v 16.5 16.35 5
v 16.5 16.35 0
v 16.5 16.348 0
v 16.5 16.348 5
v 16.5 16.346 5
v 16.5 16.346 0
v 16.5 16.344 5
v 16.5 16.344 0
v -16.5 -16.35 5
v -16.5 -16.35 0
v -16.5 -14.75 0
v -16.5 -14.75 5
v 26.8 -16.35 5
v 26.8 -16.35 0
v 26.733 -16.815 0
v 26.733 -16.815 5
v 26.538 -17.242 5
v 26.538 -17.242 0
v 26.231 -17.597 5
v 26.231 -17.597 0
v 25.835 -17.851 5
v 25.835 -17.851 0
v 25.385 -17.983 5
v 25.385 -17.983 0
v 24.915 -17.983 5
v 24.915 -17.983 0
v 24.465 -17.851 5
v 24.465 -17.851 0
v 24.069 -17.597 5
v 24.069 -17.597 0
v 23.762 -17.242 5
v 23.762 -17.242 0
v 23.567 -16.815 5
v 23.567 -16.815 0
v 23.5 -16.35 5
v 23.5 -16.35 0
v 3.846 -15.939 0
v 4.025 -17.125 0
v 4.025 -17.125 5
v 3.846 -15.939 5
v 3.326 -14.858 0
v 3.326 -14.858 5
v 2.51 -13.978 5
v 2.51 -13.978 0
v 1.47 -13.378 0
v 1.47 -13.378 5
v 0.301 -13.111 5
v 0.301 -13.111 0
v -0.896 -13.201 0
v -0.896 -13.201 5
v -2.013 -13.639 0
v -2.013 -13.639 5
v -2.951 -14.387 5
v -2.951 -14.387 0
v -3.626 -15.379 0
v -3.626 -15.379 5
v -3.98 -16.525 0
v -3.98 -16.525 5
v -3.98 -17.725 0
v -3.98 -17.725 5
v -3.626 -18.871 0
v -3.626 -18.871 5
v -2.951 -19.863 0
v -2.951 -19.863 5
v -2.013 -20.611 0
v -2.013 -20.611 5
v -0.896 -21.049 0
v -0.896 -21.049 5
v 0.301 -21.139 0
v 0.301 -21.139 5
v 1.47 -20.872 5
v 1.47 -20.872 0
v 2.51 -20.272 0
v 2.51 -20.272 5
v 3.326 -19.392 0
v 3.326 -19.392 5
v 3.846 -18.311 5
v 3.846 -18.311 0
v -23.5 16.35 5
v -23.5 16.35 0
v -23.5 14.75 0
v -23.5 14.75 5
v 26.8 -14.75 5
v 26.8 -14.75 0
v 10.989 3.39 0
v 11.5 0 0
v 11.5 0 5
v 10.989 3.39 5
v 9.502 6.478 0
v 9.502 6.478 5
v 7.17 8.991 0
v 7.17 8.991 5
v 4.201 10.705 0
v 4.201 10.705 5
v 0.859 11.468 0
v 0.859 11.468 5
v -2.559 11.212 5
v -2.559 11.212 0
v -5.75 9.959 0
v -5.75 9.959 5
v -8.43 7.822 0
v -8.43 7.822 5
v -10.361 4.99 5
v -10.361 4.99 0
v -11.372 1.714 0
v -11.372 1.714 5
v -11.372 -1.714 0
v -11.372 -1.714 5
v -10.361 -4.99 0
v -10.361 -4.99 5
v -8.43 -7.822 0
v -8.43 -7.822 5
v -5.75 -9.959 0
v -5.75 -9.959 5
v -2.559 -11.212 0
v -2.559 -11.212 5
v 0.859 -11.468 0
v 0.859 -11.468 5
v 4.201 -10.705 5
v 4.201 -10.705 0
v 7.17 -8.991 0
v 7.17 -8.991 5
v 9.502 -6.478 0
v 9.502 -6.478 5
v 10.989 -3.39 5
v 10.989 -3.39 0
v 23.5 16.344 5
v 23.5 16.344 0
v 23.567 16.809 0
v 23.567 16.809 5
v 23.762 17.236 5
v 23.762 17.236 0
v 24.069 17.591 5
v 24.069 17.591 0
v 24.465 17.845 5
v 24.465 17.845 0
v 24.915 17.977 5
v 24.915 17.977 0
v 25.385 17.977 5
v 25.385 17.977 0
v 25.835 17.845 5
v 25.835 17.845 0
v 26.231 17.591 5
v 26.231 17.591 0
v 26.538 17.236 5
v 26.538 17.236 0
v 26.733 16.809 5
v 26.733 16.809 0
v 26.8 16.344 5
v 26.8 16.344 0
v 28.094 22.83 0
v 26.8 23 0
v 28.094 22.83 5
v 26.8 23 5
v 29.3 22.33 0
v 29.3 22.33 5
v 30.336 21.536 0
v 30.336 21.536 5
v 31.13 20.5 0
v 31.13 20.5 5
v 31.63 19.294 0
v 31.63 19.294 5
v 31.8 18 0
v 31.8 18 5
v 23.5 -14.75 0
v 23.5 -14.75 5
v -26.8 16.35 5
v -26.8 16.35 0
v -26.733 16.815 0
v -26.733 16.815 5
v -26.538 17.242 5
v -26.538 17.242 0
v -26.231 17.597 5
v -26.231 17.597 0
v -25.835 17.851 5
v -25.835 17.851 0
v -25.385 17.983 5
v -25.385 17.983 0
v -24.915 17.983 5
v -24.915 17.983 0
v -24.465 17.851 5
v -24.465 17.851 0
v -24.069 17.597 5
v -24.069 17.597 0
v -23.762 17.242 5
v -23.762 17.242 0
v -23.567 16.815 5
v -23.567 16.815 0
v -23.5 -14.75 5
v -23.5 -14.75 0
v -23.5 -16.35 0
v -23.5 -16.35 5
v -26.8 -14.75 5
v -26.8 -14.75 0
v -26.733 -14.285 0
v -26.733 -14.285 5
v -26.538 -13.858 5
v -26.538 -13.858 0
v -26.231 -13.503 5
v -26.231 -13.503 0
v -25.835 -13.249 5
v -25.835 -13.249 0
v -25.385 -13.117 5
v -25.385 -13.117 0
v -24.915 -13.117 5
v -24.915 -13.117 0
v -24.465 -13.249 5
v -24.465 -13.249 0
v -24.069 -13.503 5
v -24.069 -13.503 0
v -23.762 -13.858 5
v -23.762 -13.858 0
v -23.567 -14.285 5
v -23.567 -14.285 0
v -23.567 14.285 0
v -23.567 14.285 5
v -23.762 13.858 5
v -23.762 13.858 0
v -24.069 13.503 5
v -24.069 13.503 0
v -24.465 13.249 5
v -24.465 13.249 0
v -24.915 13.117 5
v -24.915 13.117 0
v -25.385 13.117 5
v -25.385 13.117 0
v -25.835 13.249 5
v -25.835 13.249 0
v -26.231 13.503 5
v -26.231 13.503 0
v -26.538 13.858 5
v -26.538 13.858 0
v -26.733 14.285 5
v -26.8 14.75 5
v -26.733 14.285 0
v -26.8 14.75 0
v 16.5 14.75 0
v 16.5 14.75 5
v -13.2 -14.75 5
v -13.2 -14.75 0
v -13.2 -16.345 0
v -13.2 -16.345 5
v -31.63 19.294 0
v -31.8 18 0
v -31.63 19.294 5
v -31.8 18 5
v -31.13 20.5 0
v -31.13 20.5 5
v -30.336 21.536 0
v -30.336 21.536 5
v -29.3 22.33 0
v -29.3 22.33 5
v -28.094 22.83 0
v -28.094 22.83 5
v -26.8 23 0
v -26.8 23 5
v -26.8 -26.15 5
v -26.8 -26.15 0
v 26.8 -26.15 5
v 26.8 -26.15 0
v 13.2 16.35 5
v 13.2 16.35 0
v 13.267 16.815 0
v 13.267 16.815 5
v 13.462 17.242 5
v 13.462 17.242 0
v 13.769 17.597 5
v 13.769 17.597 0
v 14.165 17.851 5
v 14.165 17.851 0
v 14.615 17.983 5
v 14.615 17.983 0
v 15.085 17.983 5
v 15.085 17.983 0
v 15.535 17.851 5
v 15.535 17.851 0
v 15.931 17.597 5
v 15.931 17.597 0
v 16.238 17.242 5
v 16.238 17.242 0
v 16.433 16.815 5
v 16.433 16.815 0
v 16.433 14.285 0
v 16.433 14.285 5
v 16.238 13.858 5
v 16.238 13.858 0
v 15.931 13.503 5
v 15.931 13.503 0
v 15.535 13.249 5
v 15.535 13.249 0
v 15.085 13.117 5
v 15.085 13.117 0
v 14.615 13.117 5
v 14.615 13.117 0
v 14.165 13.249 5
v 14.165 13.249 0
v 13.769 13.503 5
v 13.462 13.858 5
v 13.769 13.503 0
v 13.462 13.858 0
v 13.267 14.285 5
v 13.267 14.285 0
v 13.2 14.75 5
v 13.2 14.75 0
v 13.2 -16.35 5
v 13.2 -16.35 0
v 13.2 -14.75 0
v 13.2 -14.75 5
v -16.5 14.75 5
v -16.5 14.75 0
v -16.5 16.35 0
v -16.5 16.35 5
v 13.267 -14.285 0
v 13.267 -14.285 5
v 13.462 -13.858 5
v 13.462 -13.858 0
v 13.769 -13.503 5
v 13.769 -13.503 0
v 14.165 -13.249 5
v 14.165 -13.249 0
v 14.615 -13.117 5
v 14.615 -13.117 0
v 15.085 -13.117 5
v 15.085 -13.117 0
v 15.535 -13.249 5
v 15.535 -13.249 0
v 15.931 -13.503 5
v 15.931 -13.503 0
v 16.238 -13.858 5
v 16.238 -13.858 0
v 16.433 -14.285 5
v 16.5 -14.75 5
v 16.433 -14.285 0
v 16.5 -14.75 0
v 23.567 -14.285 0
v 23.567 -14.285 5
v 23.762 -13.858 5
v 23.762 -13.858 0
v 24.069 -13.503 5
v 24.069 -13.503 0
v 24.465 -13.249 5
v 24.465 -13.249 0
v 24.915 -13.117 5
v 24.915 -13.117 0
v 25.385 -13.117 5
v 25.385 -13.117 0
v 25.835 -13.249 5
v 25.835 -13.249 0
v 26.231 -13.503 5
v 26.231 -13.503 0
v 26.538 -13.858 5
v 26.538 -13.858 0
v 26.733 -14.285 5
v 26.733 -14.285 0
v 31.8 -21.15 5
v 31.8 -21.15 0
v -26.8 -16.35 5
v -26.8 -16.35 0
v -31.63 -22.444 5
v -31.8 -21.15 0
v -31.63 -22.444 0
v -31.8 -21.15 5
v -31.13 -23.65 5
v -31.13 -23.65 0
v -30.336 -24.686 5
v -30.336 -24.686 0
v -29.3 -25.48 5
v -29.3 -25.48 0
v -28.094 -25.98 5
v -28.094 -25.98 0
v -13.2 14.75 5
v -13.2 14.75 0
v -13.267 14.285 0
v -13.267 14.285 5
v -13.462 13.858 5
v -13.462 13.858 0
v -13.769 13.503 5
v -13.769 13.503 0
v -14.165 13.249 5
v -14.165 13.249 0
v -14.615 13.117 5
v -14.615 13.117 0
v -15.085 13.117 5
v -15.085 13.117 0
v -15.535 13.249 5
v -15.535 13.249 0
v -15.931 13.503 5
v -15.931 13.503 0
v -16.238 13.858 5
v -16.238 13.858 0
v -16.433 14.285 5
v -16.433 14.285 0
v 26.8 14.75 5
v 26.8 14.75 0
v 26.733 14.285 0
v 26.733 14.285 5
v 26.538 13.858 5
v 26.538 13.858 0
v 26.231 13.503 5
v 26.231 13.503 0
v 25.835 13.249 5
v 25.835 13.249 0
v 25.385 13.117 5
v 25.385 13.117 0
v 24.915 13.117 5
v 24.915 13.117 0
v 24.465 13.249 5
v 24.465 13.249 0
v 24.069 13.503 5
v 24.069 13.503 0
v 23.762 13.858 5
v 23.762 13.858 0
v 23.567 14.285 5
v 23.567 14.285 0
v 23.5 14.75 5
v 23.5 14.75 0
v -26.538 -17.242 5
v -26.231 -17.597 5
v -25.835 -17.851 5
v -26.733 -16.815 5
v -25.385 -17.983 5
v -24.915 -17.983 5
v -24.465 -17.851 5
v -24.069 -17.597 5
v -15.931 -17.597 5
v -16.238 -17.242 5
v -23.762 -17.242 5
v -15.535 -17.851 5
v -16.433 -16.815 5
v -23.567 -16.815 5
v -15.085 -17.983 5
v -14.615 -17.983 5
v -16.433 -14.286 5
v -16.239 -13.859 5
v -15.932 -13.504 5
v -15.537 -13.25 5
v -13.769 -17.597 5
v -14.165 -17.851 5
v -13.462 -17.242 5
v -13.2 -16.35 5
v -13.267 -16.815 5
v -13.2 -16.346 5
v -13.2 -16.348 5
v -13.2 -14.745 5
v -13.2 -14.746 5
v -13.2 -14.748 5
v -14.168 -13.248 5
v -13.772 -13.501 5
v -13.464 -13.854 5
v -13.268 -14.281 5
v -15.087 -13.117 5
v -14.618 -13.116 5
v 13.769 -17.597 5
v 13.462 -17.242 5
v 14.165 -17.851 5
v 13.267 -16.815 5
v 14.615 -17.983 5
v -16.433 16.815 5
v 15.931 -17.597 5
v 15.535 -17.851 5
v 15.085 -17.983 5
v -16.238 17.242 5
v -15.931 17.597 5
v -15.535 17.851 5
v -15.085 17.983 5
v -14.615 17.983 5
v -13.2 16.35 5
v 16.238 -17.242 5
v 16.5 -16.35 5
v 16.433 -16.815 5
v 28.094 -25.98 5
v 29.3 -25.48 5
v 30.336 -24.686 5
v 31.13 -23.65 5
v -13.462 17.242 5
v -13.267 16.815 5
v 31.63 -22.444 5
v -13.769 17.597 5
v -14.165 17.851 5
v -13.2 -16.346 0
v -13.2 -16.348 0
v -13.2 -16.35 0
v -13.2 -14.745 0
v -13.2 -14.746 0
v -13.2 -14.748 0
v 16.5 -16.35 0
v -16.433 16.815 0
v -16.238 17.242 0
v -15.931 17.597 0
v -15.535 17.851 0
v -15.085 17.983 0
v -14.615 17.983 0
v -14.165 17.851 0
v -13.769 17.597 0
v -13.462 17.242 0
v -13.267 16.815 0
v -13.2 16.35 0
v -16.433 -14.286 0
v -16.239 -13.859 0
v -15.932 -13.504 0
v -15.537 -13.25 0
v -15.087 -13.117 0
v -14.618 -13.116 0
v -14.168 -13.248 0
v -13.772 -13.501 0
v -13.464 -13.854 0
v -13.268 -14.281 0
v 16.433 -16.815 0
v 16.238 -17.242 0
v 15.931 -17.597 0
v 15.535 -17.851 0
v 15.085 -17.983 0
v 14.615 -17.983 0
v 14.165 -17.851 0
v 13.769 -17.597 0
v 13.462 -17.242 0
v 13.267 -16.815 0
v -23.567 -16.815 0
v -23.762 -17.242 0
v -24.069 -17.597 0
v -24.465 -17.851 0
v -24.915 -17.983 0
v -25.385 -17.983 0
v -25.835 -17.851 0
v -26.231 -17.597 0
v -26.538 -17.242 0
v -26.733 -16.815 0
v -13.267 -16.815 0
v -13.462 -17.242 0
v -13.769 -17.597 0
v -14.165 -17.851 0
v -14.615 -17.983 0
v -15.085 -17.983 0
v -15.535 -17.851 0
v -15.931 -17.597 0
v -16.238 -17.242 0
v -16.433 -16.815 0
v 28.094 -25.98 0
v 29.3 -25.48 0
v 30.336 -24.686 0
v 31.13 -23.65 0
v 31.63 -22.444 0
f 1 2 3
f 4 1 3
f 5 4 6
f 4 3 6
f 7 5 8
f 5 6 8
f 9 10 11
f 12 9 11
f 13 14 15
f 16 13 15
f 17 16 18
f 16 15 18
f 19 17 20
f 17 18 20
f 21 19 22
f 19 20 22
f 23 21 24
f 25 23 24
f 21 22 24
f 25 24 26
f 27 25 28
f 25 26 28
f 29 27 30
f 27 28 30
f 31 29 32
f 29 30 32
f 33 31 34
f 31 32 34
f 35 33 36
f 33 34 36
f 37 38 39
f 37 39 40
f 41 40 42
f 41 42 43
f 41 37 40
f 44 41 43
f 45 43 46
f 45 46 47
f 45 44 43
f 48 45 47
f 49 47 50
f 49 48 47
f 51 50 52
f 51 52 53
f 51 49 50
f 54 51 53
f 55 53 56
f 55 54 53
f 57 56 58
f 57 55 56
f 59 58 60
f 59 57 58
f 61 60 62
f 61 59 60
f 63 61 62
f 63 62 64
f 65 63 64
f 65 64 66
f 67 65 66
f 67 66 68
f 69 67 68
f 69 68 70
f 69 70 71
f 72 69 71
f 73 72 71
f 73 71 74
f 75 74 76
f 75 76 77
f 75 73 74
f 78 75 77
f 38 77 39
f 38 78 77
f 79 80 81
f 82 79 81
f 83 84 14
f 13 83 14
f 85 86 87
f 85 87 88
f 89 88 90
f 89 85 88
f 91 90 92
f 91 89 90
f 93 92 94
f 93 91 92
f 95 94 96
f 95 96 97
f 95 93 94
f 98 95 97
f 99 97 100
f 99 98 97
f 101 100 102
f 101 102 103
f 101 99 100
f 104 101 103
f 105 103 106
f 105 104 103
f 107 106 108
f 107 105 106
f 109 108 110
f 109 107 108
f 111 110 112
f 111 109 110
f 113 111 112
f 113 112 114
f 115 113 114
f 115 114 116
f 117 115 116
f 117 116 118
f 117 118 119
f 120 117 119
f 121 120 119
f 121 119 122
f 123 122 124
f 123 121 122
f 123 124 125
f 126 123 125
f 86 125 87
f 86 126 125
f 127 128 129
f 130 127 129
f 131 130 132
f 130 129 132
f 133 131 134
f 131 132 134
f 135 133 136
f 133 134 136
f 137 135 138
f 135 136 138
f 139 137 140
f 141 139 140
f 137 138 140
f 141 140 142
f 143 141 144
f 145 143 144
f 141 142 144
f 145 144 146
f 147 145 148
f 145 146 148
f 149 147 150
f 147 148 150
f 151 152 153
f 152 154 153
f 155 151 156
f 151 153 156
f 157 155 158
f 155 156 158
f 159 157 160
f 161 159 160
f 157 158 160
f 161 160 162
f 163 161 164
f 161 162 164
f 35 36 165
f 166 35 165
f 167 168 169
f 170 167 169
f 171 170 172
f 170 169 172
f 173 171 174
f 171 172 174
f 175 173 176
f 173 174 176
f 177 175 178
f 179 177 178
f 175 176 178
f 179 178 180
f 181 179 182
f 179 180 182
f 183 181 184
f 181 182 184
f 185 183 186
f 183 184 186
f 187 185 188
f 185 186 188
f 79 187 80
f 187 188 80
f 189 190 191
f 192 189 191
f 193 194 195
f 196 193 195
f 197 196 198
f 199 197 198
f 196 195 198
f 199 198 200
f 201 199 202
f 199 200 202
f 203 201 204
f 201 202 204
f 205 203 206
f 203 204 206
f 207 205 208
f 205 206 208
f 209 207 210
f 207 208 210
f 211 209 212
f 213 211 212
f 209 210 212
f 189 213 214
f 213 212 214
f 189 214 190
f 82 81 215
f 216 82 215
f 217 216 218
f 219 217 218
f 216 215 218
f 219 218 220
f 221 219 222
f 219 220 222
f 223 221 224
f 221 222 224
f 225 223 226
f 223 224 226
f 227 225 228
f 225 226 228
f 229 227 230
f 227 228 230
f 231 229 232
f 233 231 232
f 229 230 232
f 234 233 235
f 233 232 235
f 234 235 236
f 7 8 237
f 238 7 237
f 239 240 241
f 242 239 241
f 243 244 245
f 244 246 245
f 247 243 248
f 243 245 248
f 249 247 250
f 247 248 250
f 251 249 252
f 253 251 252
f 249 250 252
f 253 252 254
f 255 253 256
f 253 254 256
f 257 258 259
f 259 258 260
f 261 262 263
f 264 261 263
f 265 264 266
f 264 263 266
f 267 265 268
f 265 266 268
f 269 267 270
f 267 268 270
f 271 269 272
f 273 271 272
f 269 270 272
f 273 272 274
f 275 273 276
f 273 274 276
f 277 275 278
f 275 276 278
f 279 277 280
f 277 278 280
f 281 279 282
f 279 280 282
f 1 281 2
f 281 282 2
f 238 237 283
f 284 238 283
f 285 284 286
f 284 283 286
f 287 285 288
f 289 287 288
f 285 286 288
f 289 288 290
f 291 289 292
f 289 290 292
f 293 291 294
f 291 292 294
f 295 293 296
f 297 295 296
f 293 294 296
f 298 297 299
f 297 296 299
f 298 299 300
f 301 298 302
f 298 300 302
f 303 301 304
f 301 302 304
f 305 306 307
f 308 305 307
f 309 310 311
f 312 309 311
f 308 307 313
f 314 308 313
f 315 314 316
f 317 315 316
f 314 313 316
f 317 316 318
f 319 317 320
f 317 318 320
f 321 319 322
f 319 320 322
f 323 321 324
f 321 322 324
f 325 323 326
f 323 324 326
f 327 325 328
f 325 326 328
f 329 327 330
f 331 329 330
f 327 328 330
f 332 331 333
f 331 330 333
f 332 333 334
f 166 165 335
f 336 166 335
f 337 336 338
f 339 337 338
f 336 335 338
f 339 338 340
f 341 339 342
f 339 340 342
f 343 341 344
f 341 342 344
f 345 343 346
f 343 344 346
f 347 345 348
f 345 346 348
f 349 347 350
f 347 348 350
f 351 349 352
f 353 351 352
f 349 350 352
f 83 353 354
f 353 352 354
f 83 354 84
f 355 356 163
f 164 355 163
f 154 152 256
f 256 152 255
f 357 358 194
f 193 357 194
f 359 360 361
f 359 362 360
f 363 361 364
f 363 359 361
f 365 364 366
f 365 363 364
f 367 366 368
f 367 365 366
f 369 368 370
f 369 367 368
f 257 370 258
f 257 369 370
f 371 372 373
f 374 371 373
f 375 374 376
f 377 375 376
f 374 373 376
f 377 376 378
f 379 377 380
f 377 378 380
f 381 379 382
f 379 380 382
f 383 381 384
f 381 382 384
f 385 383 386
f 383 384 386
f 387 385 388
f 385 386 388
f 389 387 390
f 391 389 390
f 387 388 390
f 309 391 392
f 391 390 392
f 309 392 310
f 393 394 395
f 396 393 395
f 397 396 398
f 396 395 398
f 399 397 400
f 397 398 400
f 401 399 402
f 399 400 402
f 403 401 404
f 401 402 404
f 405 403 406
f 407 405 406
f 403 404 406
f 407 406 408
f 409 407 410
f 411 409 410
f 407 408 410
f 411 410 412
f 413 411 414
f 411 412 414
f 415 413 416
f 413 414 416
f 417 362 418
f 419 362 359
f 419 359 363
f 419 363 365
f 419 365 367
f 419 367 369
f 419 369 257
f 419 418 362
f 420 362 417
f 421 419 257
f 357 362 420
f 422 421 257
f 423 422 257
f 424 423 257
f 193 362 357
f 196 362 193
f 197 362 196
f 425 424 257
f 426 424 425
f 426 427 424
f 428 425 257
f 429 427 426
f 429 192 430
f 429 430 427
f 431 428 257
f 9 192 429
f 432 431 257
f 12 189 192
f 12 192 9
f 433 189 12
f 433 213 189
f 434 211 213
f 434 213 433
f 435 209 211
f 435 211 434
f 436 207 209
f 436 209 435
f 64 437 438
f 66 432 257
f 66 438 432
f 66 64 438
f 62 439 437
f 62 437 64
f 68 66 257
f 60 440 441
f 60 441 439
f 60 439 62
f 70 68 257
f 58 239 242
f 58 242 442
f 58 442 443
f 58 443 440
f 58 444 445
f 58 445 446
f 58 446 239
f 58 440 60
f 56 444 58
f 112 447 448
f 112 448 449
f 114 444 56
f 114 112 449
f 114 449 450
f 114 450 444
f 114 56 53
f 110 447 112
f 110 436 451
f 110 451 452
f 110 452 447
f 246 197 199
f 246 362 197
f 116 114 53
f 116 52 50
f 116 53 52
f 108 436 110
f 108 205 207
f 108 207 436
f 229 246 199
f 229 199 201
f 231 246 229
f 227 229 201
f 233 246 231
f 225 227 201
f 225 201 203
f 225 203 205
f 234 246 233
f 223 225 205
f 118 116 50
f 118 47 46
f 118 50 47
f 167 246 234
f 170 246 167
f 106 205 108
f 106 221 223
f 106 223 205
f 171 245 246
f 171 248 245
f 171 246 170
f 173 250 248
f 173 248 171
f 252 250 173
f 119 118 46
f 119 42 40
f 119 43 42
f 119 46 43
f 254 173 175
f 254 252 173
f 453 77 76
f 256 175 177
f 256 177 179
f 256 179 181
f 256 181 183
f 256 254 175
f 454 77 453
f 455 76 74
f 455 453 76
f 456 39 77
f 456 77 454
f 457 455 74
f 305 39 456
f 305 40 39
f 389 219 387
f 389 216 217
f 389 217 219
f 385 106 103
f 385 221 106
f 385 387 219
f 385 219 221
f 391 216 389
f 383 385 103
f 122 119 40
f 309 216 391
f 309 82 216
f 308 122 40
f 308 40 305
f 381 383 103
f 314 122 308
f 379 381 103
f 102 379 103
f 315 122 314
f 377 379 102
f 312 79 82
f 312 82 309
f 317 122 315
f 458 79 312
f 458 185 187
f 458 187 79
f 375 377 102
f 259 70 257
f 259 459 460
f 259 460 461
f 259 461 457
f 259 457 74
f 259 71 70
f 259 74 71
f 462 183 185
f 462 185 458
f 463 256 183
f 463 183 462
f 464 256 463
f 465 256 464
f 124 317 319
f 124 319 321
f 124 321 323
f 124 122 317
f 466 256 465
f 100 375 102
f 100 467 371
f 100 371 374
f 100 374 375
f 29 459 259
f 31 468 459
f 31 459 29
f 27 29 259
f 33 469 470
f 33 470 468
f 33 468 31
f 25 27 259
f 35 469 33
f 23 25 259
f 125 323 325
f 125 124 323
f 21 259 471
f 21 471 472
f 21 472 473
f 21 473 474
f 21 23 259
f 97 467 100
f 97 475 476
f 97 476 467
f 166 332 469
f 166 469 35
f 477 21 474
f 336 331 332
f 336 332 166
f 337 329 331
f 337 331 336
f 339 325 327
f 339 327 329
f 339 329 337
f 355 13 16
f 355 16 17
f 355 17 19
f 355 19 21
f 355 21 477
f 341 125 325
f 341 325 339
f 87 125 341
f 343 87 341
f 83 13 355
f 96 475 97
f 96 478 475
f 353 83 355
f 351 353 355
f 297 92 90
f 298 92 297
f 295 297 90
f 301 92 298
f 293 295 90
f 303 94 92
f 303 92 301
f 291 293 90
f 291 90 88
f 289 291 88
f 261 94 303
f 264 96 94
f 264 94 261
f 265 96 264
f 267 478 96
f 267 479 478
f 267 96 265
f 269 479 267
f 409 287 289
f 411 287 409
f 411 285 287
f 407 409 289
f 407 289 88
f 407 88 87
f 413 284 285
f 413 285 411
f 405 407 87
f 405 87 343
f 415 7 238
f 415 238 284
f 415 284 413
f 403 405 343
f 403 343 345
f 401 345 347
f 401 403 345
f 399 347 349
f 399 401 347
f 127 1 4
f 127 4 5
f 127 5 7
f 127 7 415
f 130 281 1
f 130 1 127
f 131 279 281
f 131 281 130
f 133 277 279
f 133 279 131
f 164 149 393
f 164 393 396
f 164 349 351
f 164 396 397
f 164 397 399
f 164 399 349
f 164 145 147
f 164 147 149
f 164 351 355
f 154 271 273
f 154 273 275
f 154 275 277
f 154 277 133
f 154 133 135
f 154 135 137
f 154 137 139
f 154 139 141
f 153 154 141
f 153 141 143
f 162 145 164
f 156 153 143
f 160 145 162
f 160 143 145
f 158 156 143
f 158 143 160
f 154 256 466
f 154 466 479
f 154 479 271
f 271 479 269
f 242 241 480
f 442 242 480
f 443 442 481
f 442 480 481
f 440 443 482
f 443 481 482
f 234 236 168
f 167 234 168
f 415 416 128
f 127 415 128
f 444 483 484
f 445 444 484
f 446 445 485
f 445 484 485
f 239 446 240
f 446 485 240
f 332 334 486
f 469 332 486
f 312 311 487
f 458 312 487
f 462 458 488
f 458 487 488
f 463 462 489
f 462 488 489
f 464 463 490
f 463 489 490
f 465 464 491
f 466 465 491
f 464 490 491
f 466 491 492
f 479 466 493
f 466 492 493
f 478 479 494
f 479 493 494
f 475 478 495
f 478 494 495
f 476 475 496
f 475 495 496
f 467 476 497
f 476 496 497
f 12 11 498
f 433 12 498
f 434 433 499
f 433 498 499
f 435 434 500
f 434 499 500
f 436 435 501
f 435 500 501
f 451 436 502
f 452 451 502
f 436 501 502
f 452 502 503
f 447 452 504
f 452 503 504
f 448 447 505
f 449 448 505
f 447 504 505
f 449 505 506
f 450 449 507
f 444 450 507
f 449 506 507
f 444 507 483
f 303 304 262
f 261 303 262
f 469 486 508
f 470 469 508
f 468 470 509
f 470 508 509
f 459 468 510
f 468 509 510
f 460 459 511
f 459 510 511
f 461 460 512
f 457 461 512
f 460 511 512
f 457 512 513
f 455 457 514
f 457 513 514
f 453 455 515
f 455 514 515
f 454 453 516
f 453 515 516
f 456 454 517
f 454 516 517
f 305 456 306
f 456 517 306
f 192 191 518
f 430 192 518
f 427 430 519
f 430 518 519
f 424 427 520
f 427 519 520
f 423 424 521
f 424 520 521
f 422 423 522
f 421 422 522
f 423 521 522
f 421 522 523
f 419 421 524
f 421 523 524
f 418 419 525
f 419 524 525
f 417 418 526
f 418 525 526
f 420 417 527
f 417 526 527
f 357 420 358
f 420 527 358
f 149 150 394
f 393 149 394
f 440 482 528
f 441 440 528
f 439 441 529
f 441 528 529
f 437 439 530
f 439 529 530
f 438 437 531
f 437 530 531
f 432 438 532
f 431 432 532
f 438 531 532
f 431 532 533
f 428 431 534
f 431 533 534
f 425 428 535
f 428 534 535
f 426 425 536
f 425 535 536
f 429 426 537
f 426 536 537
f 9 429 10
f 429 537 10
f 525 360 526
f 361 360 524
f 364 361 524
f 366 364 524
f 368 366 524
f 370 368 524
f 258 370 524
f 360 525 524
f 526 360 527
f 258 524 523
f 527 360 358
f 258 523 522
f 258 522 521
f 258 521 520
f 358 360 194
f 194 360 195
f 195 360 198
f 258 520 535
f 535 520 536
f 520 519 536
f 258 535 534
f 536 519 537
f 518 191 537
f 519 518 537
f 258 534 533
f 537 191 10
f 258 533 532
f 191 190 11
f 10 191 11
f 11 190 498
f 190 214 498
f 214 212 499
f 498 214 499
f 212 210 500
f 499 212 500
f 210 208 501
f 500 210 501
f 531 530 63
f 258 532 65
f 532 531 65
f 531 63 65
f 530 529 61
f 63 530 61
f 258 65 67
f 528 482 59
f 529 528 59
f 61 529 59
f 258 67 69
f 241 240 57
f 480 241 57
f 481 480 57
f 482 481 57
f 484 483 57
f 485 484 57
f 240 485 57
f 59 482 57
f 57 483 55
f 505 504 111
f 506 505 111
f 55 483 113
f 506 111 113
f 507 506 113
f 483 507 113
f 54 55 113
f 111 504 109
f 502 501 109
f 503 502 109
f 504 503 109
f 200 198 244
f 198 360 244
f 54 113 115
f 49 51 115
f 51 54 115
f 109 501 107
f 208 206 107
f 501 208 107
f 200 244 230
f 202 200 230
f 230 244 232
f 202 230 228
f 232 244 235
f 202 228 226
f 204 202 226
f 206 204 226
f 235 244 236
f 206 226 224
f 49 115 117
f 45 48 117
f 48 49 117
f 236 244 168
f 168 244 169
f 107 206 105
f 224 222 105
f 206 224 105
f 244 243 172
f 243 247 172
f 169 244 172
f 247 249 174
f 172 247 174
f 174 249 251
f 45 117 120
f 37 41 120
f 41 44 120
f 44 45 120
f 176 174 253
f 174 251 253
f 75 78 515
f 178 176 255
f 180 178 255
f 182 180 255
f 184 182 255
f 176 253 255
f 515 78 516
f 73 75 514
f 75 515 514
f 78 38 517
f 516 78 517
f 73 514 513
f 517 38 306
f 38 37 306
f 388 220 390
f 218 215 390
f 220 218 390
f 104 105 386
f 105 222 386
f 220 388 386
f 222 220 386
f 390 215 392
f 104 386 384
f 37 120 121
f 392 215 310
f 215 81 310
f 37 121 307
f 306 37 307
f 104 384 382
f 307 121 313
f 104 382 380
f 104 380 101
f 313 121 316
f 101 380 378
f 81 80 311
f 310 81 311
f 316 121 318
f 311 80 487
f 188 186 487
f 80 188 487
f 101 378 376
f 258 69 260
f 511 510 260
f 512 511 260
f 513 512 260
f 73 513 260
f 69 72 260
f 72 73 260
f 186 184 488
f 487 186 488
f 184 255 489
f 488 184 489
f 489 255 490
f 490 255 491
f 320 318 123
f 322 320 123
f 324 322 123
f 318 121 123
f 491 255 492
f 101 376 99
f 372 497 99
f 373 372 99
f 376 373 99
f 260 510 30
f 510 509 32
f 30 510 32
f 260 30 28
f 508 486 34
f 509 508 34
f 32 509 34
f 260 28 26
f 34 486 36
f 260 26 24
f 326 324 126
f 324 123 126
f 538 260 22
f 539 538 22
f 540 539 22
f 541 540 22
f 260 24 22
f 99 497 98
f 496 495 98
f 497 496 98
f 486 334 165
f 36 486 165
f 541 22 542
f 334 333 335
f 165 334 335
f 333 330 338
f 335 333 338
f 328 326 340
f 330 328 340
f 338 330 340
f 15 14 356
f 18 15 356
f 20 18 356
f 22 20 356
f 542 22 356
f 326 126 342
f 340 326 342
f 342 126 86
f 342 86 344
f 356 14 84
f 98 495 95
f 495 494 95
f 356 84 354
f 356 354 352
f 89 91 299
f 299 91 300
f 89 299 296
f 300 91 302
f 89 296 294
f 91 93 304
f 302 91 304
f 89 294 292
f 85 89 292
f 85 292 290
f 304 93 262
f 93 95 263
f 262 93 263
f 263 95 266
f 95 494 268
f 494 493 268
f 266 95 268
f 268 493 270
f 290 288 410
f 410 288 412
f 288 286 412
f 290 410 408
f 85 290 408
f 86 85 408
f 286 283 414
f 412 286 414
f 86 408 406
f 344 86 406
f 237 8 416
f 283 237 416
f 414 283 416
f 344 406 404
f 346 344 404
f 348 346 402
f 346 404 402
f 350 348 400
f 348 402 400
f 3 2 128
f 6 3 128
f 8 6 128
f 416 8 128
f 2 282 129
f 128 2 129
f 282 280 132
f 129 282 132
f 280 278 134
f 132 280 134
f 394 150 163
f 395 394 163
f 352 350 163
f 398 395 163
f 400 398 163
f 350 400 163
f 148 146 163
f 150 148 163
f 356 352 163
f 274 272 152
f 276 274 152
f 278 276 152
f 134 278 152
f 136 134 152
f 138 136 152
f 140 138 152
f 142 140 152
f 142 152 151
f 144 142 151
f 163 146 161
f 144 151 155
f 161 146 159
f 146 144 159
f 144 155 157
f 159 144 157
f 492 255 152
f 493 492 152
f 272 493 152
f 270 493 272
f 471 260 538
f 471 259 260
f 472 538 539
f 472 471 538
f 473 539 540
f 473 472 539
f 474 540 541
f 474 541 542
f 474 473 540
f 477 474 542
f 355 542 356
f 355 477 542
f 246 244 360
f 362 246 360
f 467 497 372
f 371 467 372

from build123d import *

# Parameters (mm, degrees)
F0_W     = 43
F0_H     = 46
F0_R     = 4.025
F0_R_2   = 11.5
F0_H_2   = 3.15
F1_DEPTH = 5
F2_R     = 5


# Not quite as in the source:
# - ends of sketch curves that miss each other by under 0.0002 mm in the source are joined


with BuildPart() as f1:
    # F0 (on Top) → F1 (new body)
    with BuildSketch(Plane.XY):
        Polygon((-21.5, -23), (-21.5, 23), (-31.8, 23), (-31.8, -26.15), (-21.5, -26.15), align=None)
        with BuildLine():
            ThreePointArc((-23.5, -16.35), (-25.15, -18), (-26.8, -16.35))
            Line((-26.8, -16.35), (-26.8, -14.75))
            ThreePointArc((-26.8, -14.75), (-25.15, -13.1), (-23.5, -14.75))
            Line((-23.5, -14.75), (-23.5, -16.35))
        make_face(mode=Mode.SUBTRACT)
        with BuildLine():
            ThreePointArc((-23.5, 14.75), (-25.15, 13.1), (-26.8, 14.75))
            Line((-26.8, 14.75), (-26.8, 16.35))
            ThreePointArc((-26.8, 16.35), (-25.15, 18), (-23.5, 16.35))
            Line((-23.5, 16.35), (-23.5, 14.75))
        make_face(mode=Mode.SUBTRACT)
        Rectangle(F0_W, F0_H)
        with BuildLine():
            ThreePointArc((-13.2000083949, -16.3447366346), (-13.2000020987, -16.3473683139), (-13.2, -16.35))
            ThreePointArc((-13.2, -16.35), (-14.85, -18), (-16.5, -16.35))
            Line((-16.5, -16.35), (-16.5, -14.75))
            ThreePointArc((-16.5, -14.75), (-14.8526316861, -13.1000020987), (-13.2000083949, -14.7447366346))
            ThreePointArc((-13.2000083949, -14.7447366346), (-13.2000020987, -14.7473683139), (-13.2, -14.75))
            Line((-13.2, -14.75), (-13.2000083949, -16.3447366346))
        make_face(mode=Mode.SUBTRACT)
        with Locations((0, -17.125)):
            Circle(F0_R, mode=Mode.SUBTRACT)
        with BuildLine():
            ThreePointArc((16.5, -16.35), (14.85, -18), (13.2, -16.35))
            Line((13.2, -16.35), (13.2, -14.75))
            ThreePointArc((13.2, -14.75), (14.85, -13.1), (16.5, -14.75))
            Line((16.5, -14.75), (16.5, -16.35))
        make_face(mode=Mode.SUBTRACT)
        with BuildLine():
            ThreePointArc((-16.5, 16.35), (-14.85, 18), (-13.2, 16.35))
            Line((-13.2, 16.35), (-13.2, 14.75))
            ThreePointArc((-13.2, 14.75), (-14.85, 13.1), (-16.5, 14.75))
            Line((-16.5, 14.75), (-16.5, 16.35))
        make_face(mode=Mode.SUBTRACT)
        Circle(F0_R_2, mode=Mode.SUBTRACT)
        with BuildLine():
            ThreePointArc((13.2, 16.35), (14.85, 18), (16.5, 16.35))
            ThreePointArc((16.5, 16.35), (16.4999973784, 16.347058674), (16.4999895135, 16.3441173573))
            Line((16.4999895135, 16.3441173573), (16.4999895135, 14.75))
            ThreePointArc((16.4999895135, 14.75), (14.85, 13.1), (13.2, 14.75))
            Line((13.2, 14.75), (13.2, 16.35))
        make_face(mode=Mode.SUBTRACT)
        with Locations((0, -24.575)):
            Rectangle(F0_W, F0_H_2)
        Polygon((31.7999895135, 23), (21.5, 23), (21.5, -23), (21.5, -26.15), (31.7999895135, -26.15), align=None)
        with BuildLine():
            ThreePointArc((26.8, -16.35), (25.15, -18), (23.5, -16.35))
            Line((23.5, -16.35), (23.5, -14.75))
            ThreePointArc((23.5, -14.75), (25.15, -13.1), (26.8, -14.75))
            Line((26.8, -14.75), (26.8, -16.35))
        make_face(mode=Mode.SUBTRACT)
        with BuildLine():
            ThreePointArc((26.7999895135, 14.75), (25.1499895135, 13.1), (23.4999895135, 14.75))
            Line((23.4999895135, 14.75), (23.4999895135, 16.3441173573))
            ThreePointArc((23.4999895135, 16.3441173573), (25.1499895135, 17.9941173573), (26.7999895135, 16.3441173573))
            Line((26.7999895135, 16.3441173573), (26.7999895135, 14.75))
        make_face(mode=Mode.SUBTRACT)
    extrude(amount=F1_DEPTH)

    # F2
    f2_edges = [f1.edges().sort_by_distance(p)[0] for p in [
        (-31.8, 23, 2.5),
        (-31.8, -26.15, 2.5),
        (31.79999, -26.15, 2.5),
        (31.79999, 23, 2.5),
    ]]
    fillet(f2_edges, radius=F2_R)


solid = f1.part
